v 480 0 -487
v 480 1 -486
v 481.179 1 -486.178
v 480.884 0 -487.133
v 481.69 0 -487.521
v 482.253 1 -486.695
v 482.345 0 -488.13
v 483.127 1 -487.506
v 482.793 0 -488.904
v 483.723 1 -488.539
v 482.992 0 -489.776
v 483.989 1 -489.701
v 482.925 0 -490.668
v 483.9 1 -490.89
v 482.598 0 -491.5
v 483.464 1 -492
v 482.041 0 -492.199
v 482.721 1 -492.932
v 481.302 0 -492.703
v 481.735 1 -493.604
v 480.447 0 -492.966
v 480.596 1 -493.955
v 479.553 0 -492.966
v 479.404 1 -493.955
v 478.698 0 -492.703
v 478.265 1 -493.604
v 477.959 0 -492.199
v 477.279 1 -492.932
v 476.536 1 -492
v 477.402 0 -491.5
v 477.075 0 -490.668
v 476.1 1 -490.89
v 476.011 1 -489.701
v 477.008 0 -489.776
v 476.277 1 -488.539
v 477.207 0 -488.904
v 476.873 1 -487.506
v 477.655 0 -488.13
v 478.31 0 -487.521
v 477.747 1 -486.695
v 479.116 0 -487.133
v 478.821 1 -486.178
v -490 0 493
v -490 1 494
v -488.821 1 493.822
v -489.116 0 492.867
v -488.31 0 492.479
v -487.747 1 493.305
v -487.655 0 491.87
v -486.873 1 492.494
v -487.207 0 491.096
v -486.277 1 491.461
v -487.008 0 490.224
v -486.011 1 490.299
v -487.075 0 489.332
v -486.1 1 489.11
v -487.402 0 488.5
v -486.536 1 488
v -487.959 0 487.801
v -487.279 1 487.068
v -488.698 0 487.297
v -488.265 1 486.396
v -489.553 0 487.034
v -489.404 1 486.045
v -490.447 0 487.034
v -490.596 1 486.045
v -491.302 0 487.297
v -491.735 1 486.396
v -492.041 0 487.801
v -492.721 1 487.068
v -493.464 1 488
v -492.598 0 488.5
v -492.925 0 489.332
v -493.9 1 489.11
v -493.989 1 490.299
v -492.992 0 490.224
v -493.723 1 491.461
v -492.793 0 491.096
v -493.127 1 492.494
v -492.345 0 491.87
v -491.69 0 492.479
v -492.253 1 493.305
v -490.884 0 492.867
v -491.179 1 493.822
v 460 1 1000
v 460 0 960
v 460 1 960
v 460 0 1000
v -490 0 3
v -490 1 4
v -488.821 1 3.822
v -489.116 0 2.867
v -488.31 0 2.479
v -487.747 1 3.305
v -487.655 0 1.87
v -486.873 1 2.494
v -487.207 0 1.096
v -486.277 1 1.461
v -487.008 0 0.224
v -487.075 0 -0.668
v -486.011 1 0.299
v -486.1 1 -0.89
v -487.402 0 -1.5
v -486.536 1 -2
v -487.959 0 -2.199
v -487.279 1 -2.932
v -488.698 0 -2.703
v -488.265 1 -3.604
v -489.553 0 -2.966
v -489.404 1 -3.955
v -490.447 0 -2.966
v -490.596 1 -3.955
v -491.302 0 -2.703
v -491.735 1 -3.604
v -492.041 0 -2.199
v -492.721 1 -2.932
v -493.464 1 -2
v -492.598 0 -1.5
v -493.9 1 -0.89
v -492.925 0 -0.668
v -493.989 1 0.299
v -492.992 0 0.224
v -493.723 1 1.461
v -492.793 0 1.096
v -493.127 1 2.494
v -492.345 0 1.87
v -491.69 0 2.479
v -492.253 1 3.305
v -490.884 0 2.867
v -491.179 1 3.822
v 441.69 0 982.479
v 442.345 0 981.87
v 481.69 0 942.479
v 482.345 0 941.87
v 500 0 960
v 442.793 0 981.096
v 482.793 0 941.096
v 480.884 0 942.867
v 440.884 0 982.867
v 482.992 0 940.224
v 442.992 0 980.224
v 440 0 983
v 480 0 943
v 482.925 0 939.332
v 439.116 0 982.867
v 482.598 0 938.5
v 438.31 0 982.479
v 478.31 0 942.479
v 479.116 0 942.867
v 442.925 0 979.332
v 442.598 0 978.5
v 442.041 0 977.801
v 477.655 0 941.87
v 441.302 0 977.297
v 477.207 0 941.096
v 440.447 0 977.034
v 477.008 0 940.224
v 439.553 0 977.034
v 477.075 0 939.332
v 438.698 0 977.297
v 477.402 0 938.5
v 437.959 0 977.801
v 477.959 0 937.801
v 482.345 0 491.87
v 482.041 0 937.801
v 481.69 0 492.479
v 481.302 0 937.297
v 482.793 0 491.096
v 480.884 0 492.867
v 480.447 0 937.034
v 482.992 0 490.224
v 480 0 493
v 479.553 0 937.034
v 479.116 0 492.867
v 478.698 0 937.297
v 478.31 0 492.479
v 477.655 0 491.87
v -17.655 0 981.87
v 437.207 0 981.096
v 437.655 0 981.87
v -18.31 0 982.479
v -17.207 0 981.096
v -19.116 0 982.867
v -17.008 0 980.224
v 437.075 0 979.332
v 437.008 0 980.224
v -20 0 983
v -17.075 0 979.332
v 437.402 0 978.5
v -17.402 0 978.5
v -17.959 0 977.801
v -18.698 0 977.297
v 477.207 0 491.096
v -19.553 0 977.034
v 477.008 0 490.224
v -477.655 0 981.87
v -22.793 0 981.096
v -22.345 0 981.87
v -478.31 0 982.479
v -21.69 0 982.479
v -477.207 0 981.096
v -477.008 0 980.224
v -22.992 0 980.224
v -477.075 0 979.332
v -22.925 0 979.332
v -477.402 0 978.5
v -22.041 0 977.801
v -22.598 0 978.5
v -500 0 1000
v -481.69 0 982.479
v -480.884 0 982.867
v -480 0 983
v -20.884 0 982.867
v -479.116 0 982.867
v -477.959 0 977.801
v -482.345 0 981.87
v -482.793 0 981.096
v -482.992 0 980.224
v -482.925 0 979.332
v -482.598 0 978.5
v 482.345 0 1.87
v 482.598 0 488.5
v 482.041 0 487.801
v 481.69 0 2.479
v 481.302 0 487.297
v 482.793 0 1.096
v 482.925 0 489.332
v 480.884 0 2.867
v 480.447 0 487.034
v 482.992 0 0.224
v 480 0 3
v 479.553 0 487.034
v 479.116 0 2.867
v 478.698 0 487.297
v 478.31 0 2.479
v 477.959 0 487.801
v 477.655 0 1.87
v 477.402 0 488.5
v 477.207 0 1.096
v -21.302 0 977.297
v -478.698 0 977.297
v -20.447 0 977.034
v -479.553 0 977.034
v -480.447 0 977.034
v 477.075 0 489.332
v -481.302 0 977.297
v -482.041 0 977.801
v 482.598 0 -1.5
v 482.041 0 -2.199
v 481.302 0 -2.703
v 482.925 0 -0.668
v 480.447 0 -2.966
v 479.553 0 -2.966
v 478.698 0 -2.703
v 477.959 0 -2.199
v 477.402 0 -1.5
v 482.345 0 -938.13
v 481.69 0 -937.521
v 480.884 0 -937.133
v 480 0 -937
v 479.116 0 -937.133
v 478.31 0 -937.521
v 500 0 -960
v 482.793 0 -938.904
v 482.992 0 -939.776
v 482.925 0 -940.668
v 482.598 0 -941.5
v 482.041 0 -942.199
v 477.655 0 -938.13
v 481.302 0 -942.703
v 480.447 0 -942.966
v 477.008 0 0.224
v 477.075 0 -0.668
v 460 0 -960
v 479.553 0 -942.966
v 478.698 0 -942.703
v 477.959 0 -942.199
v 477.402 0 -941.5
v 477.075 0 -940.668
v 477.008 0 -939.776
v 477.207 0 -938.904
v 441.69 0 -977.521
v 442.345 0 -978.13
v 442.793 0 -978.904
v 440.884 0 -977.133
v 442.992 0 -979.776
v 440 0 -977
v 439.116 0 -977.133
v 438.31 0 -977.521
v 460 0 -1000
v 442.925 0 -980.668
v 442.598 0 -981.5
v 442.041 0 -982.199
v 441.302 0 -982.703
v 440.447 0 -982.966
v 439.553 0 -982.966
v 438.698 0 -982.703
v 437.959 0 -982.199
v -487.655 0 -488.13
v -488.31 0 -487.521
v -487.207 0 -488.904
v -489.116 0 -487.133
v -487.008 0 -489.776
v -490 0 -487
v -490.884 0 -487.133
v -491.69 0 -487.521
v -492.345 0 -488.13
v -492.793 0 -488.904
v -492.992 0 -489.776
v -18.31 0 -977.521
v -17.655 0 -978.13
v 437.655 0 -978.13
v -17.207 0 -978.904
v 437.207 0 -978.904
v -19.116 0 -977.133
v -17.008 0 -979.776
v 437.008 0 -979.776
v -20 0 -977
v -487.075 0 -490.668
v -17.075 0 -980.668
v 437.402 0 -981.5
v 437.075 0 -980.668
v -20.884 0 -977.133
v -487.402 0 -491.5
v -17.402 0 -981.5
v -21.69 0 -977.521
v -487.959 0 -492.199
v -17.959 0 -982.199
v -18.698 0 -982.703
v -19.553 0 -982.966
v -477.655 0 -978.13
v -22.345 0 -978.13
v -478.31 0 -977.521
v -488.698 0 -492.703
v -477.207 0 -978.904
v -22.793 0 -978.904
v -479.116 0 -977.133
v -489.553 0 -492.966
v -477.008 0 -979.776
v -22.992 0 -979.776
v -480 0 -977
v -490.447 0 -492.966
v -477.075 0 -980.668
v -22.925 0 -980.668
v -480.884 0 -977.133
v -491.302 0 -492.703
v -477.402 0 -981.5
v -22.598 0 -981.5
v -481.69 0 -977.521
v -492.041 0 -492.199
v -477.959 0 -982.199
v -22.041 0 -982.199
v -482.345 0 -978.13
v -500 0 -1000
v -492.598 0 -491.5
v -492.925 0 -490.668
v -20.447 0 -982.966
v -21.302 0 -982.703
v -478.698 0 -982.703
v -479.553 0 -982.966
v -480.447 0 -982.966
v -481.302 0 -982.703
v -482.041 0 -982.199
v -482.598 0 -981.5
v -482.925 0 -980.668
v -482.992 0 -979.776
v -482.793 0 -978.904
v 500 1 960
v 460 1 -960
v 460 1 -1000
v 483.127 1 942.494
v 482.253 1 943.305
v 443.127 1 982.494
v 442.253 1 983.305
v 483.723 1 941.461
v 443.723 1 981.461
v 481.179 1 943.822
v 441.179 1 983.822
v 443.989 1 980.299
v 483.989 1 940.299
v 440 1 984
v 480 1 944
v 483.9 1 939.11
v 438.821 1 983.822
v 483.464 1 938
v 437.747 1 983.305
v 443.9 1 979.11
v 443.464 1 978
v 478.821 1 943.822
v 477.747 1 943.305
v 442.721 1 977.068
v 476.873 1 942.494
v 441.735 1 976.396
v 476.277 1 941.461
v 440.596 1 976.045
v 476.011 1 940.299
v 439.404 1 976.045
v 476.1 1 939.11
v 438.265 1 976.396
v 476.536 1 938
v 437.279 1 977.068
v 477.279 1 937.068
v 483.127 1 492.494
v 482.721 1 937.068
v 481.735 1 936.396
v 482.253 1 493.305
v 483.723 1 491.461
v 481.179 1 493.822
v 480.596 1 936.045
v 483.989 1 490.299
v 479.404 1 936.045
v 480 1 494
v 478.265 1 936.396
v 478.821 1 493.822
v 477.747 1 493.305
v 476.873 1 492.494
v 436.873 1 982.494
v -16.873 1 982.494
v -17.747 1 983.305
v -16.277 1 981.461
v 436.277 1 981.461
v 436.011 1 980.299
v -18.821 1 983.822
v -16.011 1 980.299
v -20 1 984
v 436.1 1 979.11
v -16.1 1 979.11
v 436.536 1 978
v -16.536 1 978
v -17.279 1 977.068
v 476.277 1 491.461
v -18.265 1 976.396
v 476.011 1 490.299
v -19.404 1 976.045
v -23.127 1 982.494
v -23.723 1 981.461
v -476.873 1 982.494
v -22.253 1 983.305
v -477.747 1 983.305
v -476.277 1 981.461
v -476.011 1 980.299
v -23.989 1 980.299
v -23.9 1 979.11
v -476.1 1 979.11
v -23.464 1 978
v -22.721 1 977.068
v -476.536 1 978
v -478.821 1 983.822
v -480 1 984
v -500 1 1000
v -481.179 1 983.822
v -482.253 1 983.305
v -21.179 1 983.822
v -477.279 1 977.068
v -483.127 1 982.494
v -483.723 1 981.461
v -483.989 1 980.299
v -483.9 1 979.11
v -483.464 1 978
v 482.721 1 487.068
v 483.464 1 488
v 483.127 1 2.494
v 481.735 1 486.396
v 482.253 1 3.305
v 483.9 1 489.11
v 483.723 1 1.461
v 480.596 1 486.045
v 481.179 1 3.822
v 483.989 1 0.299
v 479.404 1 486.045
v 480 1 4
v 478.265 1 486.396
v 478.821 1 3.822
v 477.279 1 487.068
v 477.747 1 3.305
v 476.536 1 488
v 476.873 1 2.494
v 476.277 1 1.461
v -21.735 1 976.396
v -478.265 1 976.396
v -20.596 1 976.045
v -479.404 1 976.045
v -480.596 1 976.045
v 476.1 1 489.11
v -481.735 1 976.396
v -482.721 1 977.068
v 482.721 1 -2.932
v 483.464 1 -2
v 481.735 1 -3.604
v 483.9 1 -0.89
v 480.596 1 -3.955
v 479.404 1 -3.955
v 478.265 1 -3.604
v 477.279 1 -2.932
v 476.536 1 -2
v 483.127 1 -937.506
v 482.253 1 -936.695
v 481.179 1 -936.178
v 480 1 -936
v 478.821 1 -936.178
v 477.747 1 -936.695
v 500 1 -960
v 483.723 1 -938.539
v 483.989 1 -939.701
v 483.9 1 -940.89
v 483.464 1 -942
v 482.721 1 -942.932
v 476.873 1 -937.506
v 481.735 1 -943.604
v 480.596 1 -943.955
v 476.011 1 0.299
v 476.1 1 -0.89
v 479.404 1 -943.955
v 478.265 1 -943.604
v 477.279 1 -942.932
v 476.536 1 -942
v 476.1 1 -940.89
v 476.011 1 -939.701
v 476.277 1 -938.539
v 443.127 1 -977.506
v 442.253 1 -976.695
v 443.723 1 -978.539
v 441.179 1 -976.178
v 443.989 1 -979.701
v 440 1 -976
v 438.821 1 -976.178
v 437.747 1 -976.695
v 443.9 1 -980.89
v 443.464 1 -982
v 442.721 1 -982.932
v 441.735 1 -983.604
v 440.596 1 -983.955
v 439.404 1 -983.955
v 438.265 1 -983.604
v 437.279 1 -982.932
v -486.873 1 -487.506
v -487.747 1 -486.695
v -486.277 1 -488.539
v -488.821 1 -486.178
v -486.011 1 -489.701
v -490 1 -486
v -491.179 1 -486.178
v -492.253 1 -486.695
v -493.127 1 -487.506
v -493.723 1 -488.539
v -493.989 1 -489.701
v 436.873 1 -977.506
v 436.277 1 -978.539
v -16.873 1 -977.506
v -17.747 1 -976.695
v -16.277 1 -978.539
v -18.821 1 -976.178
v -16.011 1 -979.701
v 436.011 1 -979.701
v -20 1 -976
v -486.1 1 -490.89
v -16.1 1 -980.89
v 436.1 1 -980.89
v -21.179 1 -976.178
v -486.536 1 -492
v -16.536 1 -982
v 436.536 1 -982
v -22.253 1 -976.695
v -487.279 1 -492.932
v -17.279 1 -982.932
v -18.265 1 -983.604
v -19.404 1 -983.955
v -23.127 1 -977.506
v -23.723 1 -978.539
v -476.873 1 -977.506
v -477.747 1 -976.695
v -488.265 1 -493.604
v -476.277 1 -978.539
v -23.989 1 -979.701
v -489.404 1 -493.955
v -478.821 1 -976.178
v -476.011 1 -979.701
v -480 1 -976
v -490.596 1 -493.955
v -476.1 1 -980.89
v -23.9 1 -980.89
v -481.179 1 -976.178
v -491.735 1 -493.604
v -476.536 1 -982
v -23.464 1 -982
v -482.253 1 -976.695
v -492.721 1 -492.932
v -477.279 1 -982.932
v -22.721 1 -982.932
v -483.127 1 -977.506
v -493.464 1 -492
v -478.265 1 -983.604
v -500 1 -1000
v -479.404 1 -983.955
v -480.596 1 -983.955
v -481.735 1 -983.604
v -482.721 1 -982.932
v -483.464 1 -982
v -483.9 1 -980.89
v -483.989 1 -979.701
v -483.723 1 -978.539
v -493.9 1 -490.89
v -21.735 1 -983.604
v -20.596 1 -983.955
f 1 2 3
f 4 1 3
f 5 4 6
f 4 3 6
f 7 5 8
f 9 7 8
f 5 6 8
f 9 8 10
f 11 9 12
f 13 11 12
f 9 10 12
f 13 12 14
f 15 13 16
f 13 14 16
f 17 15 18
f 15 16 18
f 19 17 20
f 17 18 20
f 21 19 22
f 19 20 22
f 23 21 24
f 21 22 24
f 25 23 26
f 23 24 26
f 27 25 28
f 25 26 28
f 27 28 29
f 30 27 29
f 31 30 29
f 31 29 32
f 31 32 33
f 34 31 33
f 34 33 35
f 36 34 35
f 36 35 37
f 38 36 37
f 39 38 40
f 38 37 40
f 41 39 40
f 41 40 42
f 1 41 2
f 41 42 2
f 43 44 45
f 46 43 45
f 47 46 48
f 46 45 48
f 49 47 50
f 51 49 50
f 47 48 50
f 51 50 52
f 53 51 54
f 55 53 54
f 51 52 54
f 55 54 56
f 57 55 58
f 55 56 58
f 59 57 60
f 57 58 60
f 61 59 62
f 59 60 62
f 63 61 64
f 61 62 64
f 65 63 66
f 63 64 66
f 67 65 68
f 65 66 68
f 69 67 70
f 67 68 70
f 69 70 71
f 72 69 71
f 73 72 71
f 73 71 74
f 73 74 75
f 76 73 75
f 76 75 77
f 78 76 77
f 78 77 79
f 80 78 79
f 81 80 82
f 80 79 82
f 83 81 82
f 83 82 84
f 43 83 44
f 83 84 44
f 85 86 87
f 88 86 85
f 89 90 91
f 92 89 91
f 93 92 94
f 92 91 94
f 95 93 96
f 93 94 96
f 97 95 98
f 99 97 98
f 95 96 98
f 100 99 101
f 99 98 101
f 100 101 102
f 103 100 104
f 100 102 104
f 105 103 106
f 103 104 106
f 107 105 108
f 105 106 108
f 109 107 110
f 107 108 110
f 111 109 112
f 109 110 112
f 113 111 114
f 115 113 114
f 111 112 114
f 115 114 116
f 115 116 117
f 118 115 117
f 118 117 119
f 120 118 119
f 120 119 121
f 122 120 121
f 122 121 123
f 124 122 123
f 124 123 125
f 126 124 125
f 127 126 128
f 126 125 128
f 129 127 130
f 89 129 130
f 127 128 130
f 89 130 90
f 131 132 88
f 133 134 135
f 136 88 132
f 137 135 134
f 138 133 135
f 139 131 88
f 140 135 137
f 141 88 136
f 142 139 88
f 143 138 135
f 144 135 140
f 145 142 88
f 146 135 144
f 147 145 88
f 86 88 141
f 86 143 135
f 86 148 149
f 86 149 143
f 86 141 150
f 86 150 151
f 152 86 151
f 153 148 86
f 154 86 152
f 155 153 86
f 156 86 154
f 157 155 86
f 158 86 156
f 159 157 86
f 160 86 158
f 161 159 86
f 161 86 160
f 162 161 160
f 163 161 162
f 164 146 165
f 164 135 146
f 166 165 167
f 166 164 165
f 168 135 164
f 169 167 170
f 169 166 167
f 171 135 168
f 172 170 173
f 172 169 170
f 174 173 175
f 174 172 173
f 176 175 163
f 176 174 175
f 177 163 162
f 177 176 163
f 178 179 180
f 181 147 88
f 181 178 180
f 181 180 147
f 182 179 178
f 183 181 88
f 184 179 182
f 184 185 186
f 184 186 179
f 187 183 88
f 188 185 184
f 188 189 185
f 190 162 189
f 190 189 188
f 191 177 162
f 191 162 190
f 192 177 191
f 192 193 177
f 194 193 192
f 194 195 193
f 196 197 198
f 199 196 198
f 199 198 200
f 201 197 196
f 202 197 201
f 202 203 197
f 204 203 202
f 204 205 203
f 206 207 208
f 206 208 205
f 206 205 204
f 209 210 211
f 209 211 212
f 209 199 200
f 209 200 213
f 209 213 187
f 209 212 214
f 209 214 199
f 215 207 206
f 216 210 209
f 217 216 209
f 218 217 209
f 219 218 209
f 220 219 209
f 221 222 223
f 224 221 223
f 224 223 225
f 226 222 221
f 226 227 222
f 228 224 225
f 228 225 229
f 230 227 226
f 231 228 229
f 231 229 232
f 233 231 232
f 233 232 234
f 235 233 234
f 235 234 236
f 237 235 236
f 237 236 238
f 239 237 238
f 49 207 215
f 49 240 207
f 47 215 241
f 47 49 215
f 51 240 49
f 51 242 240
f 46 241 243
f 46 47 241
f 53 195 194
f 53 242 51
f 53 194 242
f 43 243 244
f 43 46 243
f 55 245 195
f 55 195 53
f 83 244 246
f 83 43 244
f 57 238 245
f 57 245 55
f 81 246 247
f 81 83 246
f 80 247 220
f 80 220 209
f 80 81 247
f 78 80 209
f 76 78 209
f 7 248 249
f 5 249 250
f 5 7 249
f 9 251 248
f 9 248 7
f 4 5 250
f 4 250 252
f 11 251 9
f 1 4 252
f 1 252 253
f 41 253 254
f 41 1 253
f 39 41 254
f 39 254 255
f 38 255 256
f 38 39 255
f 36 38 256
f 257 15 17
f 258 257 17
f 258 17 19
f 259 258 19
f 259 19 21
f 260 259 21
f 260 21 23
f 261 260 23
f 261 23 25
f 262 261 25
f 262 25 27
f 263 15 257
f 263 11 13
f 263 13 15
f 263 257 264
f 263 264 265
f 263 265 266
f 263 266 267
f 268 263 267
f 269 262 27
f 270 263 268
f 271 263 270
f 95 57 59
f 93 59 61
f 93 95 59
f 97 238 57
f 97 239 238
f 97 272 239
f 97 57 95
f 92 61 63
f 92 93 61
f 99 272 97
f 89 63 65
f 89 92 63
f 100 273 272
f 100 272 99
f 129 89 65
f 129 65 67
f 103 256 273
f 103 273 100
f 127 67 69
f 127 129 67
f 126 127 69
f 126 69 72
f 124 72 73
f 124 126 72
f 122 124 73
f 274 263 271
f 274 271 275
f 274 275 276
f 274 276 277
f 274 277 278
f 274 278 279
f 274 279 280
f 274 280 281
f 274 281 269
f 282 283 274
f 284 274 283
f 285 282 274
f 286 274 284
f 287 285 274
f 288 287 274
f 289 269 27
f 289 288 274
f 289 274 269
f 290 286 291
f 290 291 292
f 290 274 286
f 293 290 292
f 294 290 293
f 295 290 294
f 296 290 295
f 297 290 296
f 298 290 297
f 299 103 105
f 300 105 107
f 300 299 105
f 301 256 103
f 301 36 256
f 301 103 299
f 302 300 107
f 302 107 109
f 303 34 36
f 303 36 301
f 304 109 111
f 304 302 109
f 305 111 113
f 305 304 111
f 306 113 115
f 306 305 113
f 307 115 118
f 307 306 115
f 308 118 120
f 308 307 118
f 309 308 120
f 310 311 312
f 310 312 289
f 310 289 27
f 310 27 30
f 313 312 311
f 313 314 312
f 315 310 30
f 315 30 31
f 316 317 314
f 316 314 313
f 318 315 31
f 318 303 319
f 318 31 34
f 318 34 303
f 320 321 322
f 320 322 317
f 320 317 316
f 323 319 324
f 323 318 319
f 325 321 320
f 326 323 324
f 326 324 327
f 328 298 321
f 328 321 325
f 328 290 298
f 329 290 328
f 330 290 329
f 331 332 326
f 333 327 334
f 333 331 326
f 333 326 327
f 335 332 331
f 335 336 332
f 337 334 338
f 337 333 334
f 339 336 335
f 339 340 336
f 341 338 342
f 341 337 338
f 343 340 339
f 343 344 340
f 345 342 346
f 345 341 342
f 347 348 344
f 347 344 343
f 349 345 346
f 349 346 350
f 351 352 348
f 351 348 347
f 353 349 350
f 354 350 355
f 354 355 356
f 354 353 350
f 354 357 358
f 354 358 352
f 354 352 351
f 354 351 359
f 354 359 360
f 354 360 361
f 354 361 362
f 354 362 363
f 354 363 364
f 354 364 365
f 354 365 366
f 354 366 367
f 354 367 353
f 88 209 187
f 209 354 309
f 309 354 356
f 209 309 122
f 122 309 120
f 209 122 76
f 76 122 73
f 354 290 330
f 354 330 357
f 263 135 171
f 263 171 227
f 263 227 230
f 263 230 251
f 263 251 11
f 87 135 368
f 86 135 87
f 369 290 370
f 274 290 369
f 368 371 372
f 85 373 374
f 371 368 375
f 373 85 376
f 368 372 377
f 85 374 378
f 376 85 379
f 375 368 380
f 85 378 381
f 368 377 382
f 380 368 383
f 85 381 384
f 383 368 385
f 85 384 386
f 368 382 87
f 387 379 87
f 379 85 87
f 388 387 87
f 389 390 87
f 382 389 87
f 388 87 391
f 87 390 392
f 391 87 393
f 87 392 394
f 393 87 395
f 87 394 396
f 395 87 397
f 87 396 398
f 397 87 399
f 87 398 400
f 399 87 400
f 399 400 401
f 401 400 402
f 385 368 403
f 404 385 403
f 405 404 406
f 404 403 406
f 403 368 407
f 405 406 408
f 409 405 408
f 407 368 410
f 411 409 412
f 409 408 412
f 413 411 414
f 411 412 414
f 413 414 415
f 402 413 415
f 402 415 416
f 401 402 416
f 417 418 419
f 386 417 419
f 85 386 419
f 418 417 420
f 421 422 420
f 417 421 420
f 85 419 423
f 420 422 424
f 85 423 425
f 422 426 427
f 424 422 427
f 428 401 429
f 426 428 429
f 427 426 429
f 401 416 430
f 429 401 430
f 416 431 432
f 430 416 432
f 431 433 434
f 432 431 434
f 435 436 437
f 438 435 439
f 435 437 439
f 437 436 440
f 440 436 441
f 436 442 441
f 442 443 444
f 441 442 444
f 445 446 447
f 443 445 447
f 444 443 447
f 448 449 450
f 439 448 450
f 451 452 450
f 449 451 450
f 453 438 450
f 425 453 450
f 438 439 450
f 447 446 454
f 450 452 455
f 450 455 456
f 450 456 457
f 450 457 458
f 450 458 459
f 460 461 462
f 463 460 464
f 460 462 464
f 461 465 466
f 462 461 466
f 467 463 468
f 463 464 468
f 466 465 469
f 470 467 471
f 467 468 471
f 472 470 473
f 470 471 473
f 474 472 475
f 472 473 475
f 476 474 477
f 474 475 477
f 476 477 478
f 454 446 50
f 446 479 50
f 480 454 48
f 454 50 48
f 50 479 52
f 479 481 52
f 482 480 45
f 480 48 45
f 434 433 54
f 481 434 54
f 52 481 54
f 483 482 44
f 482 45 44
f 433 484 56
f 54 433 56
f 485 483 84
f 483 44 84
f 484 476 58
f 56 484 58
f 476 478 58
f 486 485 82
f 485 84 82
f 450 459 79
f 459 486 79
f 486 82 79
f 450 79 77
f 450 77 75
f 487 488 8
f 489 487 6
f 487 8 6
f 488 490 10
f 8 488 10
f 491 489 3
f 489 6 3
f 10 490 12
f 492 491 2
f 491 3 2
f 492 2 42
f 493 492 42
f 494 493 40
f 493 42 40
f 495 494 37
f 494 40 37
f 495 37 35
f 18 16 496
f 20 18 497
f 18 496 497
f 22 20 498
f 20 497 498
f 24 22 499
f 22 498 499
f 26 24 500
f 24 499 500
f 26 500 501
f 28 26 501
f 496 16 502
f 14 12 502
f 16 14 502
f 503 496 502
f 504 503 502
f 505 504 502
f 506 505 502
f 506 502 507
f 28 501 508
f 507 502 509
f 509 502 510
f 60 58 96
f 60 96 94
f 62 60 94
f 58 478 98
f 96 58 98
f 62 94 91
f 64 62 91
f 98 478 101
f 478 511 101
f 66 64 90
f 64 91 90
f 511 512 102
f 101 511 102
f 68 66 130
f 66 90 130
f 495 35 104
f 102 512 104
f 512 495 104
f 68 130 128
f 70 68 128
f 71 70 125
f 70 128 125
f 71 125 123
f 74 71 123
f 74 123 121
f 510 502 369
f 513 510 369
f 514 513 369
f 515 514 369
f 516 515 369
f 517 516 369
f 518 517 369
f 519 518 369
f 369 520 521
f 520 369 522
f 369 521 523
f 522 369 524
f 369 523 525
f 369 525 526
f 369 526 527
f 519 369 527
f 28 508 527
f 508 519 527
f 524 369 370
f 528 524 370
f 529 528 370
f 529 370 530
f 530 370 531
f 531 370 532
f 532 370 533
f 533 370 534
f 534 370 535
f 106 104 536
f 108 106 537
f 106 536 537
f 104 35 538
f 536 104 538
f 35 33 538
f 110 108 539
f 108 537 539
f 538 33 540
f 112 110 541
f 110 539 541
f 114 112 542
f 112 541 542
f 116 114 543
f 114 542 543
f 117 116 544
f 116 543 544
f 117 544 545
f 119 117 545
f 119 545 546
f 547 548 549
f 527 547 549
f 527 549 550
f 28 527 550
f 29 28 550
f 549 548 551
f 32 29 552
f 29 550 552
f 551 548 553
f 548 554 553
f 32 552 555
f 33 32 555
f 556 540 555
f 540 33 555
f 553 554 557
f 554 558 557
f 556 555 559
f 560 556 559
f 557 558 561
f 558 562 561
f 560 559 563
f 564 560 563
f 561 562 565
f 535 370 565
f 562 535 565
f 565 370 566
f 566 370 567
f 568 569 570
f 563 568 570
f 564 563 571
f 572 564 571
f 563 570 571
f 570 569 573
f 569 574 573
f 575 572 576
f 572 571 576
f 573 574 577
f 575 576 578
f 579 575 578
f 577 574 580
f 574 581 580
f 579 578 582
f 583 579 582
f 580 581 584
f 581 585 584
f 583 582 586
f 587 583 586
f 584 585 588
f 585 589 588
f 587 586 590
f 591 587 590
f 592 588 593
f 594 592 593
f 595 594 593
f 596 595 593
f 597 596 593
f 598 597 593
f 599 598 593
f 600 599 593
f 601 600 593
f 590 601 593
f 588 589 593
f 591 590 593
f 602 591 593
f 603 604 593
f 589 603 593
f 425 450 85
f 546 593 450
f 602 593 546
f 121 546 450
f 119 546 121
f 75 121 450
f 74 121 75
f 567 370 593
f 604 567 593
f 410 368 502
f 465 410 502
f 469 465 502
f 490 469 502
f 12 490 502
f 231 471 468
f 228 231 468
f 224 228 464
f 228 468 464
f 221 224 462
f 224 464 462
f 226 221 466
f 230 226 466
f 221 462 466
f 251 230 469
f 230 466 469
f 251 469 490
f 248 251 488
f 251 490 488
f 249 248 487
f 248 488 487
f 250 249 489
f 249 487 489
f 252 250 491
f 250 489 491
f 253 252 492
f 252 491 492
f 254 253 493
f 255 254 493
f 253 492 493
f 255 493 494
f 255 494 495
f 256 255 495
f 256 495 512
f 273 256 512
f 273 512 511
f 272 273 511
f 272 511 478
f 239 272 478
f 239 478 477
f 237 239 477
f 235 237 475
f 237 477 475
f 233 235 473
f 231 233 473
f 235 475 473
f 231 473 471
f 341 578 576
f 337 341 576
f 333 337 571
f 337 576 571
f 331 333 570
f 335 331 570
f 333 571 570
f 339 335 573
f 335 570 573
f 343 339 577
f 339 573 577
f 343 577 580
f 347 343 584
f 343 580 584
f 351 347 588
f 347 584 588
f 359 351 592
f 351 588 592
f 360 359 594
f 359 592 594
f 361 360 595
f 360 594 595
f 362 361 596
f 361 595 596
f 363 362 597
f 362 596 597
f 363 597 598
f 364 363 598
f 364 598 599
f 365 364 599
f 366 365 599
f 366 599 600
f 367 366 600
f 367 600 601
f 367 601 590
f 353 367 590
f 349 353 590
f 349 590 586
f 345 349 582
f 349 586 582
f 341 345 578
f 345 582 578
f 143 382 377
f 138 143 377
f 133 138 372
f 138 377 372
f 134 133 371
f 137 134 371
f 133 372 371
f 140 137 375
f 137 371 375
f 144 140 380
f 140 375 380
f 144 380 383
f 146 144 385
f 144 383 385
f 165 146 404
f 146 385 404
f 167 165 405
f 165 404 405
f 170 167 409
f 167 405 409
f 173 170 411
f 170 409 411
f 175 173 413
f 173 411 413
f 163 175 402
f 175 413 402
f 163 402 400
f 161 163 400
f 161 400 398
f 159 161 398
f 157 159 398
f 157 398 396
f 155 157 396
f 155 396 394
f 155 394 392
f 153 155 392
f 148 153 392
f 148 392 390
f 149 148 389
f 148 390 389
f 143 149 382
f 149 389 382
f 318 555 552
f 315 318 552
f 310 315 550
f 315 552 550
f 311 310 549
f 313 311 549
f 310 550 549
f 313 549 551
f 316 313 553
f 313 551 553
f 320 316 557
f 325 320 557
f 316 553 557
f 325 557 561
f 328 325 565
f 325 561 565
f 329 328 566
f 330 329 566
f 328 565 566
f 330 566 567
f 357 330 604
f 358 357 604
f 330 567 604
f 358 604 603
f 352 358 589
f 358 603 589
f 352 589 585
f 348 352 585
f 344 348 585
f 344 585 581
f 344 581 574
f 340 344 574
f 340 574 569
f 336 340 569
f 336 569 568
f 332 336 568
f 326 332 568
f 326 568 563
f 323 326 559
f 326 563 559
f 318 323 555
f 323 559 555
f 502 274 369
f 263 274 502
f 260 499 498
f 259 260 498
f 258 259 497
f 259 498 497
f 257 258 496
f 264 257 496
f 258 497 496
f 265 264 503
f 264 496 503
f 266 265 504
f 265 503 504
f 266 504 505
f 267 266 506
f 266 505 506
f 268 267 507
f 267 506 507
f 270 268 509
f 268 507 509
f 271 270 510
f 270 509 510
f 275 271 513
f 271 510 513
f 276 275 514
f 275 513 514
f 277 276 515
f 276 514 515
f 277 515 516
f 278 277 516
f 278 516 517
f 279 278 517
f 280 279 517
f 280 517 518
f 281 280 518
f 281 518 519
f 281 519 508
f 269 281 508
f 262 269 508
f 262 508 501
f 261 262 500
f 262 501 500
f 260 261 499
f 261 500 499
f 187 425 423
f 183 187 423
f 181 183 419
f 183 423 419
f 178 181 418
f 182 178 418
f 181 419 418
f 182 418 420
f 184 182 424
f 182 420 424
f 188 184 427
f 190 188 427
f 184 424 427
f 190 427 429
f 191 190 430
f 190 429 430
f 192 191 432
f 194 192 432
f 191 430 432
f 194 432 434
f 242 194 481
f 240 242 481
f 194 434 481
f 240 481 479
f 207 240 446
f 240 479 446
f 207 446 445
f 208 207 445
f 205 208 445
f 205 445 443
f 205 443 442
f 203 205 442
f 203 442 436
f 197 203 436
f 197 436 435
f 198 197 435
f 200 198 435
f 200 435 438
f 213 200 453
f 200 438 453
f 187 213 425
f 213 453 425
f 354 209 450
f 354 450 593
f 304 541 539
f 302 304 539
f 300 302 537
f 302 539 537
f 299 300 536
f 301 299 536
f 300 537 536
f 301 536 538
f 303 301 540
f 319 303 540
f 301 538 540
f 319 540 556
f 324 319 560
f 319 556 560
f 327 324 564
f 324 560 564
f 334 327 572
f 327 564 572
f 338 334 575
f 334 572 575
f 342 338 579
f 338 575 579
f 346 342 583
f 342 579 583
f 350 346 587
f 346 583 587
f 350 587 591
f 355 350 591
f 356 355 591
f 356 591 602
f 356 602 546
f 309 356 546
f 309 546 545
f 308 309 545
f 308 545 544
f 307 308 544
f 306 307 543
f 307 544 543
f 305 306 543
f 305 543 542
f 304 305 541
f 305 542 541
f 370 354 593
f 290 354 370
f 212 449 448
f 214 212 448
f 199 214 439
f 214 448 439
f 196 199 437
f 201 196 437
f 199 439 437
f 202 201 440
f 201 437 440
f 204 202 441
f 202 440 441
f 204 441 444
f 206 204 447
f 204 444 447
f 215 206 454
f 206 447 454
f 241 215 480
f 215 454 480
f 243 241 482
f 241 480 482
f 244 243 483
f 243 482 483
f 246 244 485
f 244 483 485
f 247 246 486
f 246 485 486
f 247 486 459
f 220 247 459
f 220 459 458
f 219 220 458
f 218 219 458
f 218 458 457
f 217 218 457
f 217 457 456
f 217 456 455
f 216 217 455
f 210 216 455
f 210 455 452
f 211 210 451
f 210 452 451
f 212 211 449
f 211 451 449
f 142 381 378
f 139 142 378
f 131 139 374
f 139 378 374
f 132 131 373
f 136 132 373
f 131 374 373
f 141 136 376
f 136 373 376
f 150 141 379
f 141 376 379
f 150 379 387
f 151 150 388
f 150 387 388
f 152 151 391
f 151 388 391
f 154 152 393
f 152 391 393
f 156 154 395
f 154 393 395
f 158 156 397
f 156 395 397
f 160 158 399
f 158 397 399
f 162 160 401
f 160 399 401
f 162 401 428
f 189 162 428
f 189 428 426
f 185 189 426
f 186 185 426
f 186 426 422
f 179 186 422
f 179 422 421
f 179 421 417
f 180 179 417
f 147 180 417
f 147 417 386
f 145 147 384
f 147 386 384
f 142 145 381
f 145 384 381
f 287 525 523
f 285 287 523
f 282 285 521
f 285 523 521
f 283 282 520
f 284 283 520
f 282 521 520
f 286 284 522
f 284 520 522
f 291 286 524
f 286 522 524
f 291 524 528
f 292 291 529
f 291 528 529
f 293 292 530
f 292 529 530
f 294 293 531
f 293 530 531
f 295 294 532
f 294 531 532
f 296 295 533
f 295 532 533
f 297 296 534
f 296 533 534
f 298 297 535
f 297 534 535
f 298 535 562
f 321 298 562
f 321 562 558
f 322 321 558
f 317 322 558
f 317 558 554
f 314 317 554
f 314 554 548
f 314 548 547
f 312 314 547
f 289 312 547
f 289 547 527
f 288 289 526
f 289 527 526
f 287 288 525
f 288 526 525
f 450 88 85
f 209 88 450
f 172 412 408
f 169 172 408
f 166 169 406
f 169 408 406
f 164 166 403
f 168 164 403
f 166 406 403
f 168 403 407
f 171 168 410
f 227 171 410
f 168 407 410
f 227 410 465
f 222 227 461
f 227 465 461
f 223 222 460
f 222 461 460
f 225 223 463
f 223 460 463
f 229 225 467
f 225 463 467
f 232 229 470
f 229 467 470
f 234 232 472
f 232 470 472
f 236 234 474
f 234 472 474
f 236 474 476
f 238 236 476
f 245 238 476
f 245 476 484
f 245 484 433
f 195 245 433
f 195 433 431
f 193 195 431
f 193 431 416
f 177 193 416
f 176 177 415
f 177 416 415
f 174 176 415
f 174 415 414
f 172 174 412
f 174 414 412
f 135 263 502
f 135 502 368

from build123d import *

# Parameters (mm, degrees)
SKETCH1_R           = 3
BOSS_EXTRUDE1_DEPTH = 1
CHAMFER1_SIZE       = 1


with BuildPart() as part:
    # Sketch1 → Boss-Extrude1 (new body)
    with BuildSketch(Plane(origin=(0, 0, 0), x_dir=(1, 0, 0), z_dir=(0, 1, 0))):
        Polygon((500, -960), (460, -960), (460, -1000), (-500, -1000), (-500, 1000), (460, 1000), (460, 960), (500, 960), align=None)
        with Locations(Location((480, 0, 0), (0, 0, 270))):
            Circle(SKETCH1_R, mode=Mode.SUBTRACT)
        with Locations(Location((-490, -490, 0), (0, 0, 270))):
            Circle(SKETCH1_R, mode=Mode.SUBTRACT)
        with Locations(Location((-490, 490, 0), (0, 0, 270))):
            Circle(SKETCH1_R, mode=Mode.SUBTRACT)
        with Locations(Location((-480, 980, 0), (0, 0, 270))):
            Circle(SKETCH1_R, mode=Mode.SUBTRACT)
        with Locations(Location((-480, -980, 0), (0, 0, 270))):
            Circle(SKETCH1_R, mode=Mode.SUBTRACT)
        with Locations(Location((480, 490, 0), (0, 0, 270))):
            Circle(SKETCH1_R, mode=Mode.SUBTRACT)
        with Locations(Location((-20, -980, 0), (0, 0, 270))):
            Circle(SKETCH1_R, mode=Mode.SUBTRACT)
        with Locations(Location((-20, 980, 0), (0, 0, 270))):
            Circle(SKETCH1_R, mode=Mode.SUBTRACT)
        with Locations(Location((-490, 0, 0), (0, 0, 270))):
            Circle(SKETCH1_R, mode=Mode.SUBTRACT)
        with Locations(Location((440, -980, 0), (0, 0, 270))):
            Circle(SKETCH1_R, mode=Mode.SUBTRACT)
        with Locations(Location((480, -940, 0), (0, 0, 270))):
            Circle(SKETCH1_R, mode=Mode.SUBTRACT)
        with Locations(Location((440, 980, 0), (0, 0, 270))):
            Circle(SKETCH1_R, mode=Mode.SUBTRACT)
        with Locations(Location((480, 940, 0), (0, 0, 270))):
            Circle(SKETCH1_R, mode=Mode.SUBTRACT)
        with Locations(Location((480, -490, 0), (0, 0, 270))):
            Circle(SKETCH1_R, mode=Mode.SUBTRACT)
    extrude(amount=BOSS_EXTRUDE1_DEPTH)

    # Chamfer1
    chamfer1_edges = [part.edges().sort_by_distance(p)[0] for p in [
        (480, 1, 487),
        (480, 1, -3),
        (-490, 1, 487),
        (-490, 1, -493),
        (-480, 1, -983),
        (-480, 1, 977),
        (480, 1, -493),
        (-20, 1, 977),
        (-20, 1, -983),
        (-490, 1, -3),
        (440, 1, 977),
        (480, 1, 937),
        (440, 1, -983),
        (480, 1, -943),
    ]]
    chamfer(chamfer1_edges, length=CHAMFER1_SIZE - 0.0001)  # a hair under: the kernel refuses the full size


solid = part.part
